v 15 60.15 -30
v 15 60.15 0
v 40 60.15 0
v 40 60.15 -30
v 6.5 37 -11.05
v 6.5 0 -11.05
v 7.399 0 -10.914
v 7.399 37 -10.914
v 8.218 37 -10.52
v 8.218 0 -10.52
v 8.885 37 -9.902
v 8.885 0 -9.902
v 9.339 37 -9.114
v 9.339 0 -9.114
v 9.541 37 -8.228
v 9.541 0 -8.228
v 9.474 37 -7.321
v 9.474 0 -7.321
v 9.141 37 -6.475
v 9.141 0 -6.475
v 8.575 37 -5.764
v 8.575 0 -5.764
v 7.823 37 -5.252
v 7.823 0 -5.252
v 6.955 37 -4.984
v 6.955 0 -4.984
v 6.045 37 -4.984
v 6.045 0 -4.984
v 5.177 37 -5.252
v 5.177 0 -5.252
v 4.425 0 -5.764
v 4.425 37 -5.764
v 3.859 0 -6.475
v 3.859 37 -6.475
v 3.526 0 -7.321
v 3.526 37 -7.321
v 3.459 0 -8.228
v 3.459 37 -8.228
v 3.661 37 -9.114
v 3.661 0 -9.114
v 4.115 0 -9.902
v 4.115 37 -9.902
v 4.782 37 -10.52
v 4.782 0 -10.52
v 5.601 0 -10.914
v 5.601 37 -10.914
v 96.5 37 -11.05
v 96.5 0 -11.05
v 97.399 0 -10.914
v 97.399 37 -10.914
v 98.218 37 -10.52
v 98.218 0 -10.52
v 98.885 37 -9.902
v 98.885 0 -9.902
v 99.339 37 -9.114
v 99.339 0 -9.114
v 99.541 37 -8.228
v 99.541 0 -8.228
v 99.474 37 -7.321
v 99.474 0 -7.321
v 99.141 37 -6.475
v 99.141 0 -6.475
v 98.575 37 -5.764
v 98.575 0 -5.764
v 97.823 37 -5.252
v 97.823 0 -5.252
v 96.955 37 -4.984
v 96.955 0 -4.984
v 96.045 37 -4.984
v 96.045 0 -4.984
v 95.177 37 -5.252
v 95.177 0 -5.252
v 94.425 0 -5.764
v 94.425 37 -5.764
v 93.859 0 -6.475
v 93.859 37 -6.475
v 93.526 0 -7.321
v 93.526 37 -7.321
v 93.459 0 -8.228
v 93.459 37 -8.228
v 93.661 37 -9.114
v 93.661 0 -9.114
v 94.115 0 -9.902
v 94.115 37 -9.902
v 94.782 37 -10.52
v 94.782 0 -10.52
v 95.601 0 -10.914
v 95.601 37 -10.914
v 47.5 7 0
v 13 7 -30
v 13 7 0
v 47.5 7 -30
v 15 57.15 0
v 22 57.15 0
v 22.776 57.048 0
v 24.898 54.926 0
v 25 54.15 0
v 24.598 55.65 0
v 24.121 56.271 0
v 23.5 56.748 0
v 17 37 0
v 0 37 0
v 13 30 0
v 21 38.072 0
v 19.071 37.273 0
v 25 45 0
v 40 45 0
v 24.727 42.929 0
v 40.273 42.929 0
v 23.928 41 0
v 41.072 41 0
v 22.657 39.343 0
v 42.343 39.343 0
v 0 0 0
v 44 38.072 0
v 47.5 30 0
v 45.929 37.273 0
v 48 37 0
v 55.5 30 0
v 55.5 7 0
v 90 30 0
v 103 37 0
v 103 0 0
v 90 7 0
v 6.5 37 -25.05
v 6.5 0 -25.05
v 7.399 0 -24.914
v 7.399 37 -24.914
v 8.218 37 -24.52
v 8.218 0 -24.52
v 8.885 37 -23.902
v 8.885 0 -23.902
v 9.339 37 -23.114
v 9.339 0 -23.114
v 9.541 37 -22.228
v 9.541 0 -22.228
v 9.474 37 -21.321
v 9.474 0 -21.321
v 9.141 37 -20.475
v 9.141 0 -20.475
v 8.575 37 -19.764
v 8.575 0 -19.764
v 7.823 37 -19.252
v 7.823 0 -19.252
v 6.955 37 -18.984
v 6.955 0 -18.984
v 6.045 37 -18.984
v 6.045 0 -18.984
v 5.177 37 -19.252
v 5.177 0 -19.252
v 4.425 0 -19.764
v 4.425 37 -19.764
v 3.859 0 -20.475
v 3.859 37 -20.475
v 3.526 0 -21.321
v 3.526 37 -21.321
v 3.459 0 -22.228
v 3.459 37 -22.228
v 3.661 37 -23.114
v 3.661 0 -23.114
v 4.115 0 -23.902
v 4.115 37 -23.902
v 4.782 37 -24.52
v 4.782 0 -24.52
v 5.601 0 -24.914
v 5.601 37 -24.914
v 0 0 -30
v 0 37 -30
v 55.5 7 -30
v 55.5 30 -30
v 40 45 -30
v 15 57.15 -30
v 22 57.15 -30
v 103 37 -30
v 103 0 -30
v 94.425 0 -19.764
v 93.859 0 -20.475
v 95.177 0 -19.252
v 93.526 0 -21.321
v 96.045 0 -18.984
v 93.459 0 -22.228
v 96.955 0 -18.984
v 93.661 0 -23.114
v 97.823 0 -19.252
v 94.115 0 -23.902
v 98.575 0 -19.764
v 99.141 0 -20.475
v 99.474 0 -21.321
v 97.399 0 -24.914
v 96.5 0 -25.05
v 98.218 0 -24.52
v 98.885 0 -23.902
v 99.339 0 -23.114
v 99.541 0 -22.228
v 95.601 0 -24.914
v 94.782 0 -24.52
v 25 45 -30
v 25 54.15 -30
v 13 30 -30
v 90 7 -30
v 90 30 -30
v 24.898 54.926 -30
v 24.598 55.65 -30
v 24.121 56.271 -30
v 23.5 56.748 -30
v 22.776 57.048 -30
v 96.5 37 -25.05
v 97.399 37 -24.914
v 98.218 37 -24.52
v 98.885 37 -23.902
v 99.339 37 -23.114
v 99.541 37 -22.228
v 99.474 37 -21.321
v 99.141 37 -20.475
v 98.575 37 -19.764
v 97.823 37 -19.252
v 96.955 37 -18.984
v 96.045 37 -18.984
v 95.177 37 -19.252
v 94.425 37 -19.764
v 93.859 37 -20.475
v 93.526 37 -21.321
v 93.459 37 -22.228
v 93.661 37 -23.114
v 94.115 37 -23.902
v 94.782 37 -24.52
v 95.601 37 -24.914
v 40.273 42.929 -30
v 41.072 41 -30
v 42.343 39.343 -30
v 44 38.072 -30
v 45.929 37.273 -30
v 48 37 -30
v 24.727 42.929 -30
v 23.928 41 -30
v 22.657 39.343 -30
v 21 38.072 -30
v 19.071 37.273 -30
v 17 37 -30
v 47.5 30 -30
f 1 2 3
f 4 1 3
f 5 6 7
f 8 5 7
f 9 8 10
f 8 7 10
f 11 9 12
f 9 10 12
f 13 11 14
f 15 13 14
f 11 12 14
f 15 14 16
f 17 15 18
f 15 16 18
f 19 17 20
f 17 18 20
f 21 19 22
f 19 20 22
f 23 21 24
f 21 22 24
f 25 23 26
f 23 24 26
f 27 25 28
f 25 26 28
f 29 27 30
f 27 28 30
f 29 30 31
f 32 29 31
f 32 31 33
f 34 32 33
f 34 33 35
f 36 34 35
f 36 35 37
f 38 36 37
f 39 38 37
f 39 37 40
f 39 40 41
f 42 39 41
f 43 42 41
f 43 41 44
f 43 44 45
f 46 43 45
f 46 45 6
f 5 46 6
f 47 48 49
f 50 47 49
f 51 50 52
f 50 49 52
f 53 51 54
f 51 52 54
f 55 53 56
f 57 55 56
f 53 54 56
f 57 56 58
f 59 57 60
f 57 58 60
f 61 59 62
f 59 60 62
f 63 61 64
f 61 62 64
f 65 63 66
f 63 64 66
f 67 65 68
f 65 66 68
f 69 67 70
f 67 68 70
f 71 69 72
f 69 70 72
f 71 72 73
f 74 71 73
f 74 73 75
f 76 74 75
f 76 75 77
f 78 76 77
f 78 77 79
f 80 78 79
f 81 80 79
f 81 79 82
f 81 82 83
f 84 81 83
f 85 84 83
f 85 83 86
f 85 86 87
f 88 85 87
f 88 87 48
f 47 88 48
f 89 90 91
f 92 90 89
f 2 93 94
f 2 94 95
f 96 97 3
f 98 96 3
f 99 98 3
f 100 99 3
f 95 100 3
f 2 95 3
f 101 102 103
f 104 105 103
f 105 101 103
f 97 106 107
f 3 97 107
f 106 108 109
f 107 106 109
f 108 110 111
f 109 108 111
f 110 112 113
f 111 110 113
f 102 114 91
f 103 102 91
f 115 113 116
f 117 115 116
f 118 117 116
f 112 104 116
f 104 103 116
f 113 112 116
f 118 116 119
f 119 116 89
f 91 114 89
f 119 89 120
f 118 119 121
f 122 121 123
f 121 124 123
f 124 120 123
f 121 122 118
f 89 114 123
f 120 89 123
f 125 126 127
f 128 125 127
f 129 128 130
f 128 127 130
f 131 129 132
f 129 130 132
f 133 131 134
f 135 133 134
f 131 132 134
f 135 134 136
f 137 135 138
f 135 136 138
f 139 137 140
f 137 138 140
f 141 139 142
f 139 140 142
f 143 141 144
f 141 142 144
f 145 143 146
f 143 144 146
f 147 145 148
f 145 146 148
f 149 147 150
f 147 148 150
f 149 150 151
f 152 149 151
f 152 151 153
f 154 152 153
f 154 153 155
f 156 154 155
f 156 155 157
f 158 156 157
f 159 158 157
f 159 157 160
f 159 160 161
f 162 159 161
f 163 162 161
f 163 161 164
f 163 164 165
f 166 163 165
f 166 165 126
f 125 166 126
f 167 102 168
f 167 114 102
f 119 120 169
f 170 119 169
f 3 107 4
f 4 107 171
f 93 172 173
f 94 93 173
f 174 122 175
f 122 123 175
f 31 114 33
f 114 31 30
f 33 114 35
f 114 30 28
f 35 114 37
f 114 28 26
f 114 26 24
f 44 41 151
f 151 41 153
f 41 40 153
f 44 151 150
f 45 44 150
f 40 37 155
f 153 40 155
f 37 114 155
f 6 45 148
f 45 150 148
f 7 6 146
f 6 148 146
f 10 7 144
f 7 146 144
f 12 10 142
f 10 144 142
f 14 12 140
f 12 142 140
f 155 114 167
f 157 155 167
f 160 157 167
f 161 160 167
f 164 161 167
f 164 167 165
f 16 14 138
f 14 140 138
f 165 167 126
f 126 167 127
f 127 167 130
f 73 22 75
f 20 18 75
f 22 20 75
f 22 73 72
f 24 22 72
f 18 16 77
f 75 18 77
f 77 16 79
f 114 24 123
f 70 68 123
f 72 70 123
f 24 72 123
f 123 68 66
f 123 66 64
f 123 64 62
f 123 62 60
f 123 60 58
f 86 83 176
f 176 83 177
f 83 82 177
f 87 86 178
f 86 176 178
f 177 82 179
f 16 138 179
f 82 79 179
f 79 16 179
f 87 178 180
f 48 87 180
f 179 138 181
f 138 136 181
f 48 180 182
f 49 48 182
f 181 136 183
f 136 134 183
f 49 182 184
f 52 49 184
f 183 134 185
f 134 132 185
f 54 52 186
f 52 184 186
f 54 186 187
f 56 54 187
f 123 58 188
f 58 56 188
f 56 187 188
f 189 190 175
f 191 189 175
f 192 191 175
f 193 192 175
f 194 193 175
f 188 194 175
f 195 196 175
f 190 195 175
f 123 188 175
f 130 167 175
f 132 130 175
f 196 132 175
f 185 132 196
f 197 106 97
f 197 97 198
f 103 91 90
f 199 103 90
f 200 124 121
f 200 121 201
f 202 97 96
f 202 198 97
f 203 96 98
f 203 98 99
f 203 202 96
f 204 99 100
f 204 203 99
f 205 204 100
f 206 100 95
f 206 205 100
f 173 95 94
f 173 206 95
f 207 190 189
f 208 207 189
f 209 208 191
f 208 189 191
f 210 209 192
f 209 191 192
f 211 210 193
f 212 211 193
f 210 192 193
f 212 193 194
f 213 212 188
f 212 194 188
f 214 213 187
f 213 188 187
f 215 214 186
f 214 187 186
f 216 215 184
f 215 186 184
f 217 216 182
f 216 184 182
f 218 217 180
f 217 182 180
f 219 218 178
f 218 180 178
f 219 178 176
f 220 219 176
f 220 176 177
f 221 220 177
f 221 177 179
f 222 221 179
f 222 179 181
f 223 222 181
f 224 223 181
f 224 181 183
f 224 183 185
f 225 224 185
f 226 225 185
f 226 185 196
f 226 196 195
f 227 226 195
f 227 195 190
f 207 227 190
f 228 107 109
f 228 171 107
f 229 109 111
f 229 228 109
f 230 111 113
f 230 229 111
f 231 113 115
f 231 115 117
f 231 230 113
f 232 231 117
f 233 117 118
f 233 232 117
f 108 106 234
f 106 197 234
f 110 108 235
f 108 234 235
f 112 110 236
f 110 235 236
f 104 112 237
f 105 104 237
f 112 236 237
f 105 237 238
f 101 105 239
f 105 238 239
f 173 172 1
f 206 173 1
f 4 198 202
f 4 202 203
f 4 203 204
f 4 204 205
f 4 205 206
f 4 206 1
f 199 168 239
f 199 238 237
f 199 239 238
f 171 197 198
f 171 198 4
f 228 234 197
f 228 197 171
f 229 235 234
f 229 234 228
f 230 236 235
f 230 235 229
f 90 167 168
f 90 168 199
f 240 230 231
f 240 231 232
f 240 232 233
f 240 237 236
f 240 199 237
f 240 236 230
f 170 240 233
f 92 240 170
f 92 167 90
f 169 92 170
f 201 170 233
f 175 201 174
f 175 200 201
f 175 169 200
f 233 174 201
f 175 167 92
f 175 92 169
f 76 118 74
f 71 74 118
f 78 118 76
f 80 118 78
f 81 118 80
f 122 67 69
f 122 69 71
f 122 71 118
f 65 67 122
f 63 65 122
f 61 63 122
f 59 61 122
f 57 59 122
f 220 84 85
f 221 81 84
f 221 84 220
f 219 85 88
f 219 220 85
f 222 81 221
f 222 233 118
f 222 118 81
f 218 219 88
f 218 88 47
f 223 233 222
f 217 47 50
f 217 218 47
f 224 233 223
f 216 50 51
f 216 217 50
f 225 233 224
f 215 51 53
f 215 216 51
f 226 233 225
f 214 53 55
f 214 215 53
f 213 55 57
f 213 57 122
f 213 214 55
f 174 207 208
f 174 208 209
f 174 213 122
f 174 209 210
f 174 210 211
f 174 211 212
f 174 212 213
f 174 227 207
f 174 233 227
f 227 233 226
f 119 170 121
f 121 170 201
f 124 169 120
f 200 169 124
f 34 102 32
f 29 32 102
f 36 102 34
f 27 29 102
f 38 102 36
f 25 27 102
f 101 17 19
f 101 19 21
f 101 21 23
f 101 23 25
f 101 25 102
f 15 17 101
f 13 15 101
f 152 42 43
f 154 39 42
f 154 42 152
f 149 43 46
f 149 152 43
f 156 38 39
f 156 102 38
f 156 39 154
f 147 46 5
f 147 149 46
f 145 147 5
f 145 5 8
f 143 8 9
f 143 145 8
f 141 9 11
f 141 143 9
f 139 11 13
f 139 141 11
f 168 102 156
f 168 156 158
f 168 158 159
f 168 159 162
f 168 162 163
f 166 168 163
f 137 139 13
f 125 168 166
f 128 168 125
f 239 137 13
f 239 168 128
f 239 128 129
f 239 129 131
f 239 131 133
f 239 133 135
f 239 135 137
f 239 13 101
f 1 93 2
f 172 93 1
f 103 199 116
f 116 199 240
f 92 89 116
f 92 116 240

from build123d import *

# Parameters (mm, degrees)
SKETCH1_W           = 103
SKETCH1_H           = 30
BOSS_EXTRUDE1_DEPTH = 7
SKETCH2_W           = 13
SKETCH2_H           = 30
SKETCH2_W_2         = 4
BOSS_EXTRUDE2_DEPTH = 23
SKETCH3_W           = 103
SKETCH3_H           = 30
BOSS_EXTRUDE3_DEPTH = 7
SKETCH4_W           = 15
SKETCH4_H           = 30
BOSS_EXTRUDE4_DEPTH = 20.15
SKETCH5_W           = 25
SKETCH5_H           = 30
BOSS_EXTRUDE5_DEPTH = 3
FILLET2_R           = 3
FILLET3_R           = 8
SKETCH6_R           = 3.05
CUT_EXTRUDE1_DEPTH  = 40


with BuildPart() as part:
    # Sketch1 → Boss-Extrude1 (new body)
    with BuildSketch(Plane(origin=(0, 0, 0), x_dir=(1, 0, 0), z_dir=(0, 1, 0))):
        with Locations((51.5, 15)):
            Rectangle(SKETCH1_W, SKETCH1_H)
    extrude(amount=BOSS_EXTRUDE1_DEPTH)

    # Sketch2 → Boss-Extrude2 (add)
    with BuildSketch(Plane(origin=(0, 7, 0), x_dir=(1, 0, 0), z_dir=(0, 1, 0))):
        with Locations((6.5, 15)):
            Rectangle(SKETCH2_W, SKETCH2_H)
        with Locations((49.5, 15)):
            Rectangle(SKETCH2_W_2, SKETCH2_H)
        with Locations((53.5, 15)):
            Rectangle(SKETCH2_W_2, SKETCH2_H)
        with Locations((96.5, 15)):
            Rectangle(SKETCH2_W, SKETCH2_H)
    extrude(amount=BOSS_EXTRUDE2_DEPTH)

    # Sketch3 → Boss-Extrude3 (add)
    with BuildSketch(Plane(origin=(0, 30, 0), x_dir=(1, 0, 0), z_dir=(0, 1, 0))):
        with Locations((51.5, 15)):
            Rectangle(SKETCH3_W, SKETCH3_H)
    extrude(amount=BOSS_EXTRUDE3_DEPTH)

    # Sketch4 → Boss-Extrude4 (add)
    with BuildSketch(Plane(origin=(0, 37, 0), x_dir=(1, 0, 0), z_dir=(0, 1, 0))):
        with Locations((32.5, 15)):
            Rectangle(SKETCH4_W, SKETCH4_H)
    extrude(amount=BOSS_EXTRUDE4_DEPTH)

    # Sketch5 → Boss-Extrude5 (add)
    with BuildSketch(Plane(origin=(0, 57.15, 0), x_dir=(1, 0, 0), z_dir=(0, 1, 0))):
        with Locations((27.5, 15)):
            Rectangle(SKETCH5_W, SKETCH5_H)
    extrude(amount=BOSS_EXTRUDE5_DEPTH)

    # Fillet2
    fillet2_edges = [part.edges().sort_by_distance(p)[0] for p in [
        (25, 57.15, -15),
    ]]
    fillet(fillet2_edges, radius=FILLET2_R)

    # Fillet3
    fillet3_edges = [part.edges().sort_by_distance(p)[0] for p in [
        (25, 37, -15),
        (40, 37, -15),
    ]]
    fillet(fillet3_edges, radius=FILLET3_R)

    # Sketch6 → Cut-Extrude1 (cut)
    with BuildSketch(Plane.XZ):
        with Locations(Location((6.5, -22, 0), (0, 0, 270))):
            Circle(SKETCH6_R)
        with Locations(Location((6.5, -8, 0), (0, 0, 270))):
            Circle(SKETCH6_R)
        with Locations(Location((96.5, -8, 0), (0, 0, 270))):
            Circle(SKETCH6_R)
        with Locations(Location((96.5, -22, 0), (0, 0, 270))):
            Circle(SKETCH6_R)
    extrude(amount=-CUT_EXTRUDE1_DEPTH, mode=Mode.SUBTRACT)


solid = part.part
